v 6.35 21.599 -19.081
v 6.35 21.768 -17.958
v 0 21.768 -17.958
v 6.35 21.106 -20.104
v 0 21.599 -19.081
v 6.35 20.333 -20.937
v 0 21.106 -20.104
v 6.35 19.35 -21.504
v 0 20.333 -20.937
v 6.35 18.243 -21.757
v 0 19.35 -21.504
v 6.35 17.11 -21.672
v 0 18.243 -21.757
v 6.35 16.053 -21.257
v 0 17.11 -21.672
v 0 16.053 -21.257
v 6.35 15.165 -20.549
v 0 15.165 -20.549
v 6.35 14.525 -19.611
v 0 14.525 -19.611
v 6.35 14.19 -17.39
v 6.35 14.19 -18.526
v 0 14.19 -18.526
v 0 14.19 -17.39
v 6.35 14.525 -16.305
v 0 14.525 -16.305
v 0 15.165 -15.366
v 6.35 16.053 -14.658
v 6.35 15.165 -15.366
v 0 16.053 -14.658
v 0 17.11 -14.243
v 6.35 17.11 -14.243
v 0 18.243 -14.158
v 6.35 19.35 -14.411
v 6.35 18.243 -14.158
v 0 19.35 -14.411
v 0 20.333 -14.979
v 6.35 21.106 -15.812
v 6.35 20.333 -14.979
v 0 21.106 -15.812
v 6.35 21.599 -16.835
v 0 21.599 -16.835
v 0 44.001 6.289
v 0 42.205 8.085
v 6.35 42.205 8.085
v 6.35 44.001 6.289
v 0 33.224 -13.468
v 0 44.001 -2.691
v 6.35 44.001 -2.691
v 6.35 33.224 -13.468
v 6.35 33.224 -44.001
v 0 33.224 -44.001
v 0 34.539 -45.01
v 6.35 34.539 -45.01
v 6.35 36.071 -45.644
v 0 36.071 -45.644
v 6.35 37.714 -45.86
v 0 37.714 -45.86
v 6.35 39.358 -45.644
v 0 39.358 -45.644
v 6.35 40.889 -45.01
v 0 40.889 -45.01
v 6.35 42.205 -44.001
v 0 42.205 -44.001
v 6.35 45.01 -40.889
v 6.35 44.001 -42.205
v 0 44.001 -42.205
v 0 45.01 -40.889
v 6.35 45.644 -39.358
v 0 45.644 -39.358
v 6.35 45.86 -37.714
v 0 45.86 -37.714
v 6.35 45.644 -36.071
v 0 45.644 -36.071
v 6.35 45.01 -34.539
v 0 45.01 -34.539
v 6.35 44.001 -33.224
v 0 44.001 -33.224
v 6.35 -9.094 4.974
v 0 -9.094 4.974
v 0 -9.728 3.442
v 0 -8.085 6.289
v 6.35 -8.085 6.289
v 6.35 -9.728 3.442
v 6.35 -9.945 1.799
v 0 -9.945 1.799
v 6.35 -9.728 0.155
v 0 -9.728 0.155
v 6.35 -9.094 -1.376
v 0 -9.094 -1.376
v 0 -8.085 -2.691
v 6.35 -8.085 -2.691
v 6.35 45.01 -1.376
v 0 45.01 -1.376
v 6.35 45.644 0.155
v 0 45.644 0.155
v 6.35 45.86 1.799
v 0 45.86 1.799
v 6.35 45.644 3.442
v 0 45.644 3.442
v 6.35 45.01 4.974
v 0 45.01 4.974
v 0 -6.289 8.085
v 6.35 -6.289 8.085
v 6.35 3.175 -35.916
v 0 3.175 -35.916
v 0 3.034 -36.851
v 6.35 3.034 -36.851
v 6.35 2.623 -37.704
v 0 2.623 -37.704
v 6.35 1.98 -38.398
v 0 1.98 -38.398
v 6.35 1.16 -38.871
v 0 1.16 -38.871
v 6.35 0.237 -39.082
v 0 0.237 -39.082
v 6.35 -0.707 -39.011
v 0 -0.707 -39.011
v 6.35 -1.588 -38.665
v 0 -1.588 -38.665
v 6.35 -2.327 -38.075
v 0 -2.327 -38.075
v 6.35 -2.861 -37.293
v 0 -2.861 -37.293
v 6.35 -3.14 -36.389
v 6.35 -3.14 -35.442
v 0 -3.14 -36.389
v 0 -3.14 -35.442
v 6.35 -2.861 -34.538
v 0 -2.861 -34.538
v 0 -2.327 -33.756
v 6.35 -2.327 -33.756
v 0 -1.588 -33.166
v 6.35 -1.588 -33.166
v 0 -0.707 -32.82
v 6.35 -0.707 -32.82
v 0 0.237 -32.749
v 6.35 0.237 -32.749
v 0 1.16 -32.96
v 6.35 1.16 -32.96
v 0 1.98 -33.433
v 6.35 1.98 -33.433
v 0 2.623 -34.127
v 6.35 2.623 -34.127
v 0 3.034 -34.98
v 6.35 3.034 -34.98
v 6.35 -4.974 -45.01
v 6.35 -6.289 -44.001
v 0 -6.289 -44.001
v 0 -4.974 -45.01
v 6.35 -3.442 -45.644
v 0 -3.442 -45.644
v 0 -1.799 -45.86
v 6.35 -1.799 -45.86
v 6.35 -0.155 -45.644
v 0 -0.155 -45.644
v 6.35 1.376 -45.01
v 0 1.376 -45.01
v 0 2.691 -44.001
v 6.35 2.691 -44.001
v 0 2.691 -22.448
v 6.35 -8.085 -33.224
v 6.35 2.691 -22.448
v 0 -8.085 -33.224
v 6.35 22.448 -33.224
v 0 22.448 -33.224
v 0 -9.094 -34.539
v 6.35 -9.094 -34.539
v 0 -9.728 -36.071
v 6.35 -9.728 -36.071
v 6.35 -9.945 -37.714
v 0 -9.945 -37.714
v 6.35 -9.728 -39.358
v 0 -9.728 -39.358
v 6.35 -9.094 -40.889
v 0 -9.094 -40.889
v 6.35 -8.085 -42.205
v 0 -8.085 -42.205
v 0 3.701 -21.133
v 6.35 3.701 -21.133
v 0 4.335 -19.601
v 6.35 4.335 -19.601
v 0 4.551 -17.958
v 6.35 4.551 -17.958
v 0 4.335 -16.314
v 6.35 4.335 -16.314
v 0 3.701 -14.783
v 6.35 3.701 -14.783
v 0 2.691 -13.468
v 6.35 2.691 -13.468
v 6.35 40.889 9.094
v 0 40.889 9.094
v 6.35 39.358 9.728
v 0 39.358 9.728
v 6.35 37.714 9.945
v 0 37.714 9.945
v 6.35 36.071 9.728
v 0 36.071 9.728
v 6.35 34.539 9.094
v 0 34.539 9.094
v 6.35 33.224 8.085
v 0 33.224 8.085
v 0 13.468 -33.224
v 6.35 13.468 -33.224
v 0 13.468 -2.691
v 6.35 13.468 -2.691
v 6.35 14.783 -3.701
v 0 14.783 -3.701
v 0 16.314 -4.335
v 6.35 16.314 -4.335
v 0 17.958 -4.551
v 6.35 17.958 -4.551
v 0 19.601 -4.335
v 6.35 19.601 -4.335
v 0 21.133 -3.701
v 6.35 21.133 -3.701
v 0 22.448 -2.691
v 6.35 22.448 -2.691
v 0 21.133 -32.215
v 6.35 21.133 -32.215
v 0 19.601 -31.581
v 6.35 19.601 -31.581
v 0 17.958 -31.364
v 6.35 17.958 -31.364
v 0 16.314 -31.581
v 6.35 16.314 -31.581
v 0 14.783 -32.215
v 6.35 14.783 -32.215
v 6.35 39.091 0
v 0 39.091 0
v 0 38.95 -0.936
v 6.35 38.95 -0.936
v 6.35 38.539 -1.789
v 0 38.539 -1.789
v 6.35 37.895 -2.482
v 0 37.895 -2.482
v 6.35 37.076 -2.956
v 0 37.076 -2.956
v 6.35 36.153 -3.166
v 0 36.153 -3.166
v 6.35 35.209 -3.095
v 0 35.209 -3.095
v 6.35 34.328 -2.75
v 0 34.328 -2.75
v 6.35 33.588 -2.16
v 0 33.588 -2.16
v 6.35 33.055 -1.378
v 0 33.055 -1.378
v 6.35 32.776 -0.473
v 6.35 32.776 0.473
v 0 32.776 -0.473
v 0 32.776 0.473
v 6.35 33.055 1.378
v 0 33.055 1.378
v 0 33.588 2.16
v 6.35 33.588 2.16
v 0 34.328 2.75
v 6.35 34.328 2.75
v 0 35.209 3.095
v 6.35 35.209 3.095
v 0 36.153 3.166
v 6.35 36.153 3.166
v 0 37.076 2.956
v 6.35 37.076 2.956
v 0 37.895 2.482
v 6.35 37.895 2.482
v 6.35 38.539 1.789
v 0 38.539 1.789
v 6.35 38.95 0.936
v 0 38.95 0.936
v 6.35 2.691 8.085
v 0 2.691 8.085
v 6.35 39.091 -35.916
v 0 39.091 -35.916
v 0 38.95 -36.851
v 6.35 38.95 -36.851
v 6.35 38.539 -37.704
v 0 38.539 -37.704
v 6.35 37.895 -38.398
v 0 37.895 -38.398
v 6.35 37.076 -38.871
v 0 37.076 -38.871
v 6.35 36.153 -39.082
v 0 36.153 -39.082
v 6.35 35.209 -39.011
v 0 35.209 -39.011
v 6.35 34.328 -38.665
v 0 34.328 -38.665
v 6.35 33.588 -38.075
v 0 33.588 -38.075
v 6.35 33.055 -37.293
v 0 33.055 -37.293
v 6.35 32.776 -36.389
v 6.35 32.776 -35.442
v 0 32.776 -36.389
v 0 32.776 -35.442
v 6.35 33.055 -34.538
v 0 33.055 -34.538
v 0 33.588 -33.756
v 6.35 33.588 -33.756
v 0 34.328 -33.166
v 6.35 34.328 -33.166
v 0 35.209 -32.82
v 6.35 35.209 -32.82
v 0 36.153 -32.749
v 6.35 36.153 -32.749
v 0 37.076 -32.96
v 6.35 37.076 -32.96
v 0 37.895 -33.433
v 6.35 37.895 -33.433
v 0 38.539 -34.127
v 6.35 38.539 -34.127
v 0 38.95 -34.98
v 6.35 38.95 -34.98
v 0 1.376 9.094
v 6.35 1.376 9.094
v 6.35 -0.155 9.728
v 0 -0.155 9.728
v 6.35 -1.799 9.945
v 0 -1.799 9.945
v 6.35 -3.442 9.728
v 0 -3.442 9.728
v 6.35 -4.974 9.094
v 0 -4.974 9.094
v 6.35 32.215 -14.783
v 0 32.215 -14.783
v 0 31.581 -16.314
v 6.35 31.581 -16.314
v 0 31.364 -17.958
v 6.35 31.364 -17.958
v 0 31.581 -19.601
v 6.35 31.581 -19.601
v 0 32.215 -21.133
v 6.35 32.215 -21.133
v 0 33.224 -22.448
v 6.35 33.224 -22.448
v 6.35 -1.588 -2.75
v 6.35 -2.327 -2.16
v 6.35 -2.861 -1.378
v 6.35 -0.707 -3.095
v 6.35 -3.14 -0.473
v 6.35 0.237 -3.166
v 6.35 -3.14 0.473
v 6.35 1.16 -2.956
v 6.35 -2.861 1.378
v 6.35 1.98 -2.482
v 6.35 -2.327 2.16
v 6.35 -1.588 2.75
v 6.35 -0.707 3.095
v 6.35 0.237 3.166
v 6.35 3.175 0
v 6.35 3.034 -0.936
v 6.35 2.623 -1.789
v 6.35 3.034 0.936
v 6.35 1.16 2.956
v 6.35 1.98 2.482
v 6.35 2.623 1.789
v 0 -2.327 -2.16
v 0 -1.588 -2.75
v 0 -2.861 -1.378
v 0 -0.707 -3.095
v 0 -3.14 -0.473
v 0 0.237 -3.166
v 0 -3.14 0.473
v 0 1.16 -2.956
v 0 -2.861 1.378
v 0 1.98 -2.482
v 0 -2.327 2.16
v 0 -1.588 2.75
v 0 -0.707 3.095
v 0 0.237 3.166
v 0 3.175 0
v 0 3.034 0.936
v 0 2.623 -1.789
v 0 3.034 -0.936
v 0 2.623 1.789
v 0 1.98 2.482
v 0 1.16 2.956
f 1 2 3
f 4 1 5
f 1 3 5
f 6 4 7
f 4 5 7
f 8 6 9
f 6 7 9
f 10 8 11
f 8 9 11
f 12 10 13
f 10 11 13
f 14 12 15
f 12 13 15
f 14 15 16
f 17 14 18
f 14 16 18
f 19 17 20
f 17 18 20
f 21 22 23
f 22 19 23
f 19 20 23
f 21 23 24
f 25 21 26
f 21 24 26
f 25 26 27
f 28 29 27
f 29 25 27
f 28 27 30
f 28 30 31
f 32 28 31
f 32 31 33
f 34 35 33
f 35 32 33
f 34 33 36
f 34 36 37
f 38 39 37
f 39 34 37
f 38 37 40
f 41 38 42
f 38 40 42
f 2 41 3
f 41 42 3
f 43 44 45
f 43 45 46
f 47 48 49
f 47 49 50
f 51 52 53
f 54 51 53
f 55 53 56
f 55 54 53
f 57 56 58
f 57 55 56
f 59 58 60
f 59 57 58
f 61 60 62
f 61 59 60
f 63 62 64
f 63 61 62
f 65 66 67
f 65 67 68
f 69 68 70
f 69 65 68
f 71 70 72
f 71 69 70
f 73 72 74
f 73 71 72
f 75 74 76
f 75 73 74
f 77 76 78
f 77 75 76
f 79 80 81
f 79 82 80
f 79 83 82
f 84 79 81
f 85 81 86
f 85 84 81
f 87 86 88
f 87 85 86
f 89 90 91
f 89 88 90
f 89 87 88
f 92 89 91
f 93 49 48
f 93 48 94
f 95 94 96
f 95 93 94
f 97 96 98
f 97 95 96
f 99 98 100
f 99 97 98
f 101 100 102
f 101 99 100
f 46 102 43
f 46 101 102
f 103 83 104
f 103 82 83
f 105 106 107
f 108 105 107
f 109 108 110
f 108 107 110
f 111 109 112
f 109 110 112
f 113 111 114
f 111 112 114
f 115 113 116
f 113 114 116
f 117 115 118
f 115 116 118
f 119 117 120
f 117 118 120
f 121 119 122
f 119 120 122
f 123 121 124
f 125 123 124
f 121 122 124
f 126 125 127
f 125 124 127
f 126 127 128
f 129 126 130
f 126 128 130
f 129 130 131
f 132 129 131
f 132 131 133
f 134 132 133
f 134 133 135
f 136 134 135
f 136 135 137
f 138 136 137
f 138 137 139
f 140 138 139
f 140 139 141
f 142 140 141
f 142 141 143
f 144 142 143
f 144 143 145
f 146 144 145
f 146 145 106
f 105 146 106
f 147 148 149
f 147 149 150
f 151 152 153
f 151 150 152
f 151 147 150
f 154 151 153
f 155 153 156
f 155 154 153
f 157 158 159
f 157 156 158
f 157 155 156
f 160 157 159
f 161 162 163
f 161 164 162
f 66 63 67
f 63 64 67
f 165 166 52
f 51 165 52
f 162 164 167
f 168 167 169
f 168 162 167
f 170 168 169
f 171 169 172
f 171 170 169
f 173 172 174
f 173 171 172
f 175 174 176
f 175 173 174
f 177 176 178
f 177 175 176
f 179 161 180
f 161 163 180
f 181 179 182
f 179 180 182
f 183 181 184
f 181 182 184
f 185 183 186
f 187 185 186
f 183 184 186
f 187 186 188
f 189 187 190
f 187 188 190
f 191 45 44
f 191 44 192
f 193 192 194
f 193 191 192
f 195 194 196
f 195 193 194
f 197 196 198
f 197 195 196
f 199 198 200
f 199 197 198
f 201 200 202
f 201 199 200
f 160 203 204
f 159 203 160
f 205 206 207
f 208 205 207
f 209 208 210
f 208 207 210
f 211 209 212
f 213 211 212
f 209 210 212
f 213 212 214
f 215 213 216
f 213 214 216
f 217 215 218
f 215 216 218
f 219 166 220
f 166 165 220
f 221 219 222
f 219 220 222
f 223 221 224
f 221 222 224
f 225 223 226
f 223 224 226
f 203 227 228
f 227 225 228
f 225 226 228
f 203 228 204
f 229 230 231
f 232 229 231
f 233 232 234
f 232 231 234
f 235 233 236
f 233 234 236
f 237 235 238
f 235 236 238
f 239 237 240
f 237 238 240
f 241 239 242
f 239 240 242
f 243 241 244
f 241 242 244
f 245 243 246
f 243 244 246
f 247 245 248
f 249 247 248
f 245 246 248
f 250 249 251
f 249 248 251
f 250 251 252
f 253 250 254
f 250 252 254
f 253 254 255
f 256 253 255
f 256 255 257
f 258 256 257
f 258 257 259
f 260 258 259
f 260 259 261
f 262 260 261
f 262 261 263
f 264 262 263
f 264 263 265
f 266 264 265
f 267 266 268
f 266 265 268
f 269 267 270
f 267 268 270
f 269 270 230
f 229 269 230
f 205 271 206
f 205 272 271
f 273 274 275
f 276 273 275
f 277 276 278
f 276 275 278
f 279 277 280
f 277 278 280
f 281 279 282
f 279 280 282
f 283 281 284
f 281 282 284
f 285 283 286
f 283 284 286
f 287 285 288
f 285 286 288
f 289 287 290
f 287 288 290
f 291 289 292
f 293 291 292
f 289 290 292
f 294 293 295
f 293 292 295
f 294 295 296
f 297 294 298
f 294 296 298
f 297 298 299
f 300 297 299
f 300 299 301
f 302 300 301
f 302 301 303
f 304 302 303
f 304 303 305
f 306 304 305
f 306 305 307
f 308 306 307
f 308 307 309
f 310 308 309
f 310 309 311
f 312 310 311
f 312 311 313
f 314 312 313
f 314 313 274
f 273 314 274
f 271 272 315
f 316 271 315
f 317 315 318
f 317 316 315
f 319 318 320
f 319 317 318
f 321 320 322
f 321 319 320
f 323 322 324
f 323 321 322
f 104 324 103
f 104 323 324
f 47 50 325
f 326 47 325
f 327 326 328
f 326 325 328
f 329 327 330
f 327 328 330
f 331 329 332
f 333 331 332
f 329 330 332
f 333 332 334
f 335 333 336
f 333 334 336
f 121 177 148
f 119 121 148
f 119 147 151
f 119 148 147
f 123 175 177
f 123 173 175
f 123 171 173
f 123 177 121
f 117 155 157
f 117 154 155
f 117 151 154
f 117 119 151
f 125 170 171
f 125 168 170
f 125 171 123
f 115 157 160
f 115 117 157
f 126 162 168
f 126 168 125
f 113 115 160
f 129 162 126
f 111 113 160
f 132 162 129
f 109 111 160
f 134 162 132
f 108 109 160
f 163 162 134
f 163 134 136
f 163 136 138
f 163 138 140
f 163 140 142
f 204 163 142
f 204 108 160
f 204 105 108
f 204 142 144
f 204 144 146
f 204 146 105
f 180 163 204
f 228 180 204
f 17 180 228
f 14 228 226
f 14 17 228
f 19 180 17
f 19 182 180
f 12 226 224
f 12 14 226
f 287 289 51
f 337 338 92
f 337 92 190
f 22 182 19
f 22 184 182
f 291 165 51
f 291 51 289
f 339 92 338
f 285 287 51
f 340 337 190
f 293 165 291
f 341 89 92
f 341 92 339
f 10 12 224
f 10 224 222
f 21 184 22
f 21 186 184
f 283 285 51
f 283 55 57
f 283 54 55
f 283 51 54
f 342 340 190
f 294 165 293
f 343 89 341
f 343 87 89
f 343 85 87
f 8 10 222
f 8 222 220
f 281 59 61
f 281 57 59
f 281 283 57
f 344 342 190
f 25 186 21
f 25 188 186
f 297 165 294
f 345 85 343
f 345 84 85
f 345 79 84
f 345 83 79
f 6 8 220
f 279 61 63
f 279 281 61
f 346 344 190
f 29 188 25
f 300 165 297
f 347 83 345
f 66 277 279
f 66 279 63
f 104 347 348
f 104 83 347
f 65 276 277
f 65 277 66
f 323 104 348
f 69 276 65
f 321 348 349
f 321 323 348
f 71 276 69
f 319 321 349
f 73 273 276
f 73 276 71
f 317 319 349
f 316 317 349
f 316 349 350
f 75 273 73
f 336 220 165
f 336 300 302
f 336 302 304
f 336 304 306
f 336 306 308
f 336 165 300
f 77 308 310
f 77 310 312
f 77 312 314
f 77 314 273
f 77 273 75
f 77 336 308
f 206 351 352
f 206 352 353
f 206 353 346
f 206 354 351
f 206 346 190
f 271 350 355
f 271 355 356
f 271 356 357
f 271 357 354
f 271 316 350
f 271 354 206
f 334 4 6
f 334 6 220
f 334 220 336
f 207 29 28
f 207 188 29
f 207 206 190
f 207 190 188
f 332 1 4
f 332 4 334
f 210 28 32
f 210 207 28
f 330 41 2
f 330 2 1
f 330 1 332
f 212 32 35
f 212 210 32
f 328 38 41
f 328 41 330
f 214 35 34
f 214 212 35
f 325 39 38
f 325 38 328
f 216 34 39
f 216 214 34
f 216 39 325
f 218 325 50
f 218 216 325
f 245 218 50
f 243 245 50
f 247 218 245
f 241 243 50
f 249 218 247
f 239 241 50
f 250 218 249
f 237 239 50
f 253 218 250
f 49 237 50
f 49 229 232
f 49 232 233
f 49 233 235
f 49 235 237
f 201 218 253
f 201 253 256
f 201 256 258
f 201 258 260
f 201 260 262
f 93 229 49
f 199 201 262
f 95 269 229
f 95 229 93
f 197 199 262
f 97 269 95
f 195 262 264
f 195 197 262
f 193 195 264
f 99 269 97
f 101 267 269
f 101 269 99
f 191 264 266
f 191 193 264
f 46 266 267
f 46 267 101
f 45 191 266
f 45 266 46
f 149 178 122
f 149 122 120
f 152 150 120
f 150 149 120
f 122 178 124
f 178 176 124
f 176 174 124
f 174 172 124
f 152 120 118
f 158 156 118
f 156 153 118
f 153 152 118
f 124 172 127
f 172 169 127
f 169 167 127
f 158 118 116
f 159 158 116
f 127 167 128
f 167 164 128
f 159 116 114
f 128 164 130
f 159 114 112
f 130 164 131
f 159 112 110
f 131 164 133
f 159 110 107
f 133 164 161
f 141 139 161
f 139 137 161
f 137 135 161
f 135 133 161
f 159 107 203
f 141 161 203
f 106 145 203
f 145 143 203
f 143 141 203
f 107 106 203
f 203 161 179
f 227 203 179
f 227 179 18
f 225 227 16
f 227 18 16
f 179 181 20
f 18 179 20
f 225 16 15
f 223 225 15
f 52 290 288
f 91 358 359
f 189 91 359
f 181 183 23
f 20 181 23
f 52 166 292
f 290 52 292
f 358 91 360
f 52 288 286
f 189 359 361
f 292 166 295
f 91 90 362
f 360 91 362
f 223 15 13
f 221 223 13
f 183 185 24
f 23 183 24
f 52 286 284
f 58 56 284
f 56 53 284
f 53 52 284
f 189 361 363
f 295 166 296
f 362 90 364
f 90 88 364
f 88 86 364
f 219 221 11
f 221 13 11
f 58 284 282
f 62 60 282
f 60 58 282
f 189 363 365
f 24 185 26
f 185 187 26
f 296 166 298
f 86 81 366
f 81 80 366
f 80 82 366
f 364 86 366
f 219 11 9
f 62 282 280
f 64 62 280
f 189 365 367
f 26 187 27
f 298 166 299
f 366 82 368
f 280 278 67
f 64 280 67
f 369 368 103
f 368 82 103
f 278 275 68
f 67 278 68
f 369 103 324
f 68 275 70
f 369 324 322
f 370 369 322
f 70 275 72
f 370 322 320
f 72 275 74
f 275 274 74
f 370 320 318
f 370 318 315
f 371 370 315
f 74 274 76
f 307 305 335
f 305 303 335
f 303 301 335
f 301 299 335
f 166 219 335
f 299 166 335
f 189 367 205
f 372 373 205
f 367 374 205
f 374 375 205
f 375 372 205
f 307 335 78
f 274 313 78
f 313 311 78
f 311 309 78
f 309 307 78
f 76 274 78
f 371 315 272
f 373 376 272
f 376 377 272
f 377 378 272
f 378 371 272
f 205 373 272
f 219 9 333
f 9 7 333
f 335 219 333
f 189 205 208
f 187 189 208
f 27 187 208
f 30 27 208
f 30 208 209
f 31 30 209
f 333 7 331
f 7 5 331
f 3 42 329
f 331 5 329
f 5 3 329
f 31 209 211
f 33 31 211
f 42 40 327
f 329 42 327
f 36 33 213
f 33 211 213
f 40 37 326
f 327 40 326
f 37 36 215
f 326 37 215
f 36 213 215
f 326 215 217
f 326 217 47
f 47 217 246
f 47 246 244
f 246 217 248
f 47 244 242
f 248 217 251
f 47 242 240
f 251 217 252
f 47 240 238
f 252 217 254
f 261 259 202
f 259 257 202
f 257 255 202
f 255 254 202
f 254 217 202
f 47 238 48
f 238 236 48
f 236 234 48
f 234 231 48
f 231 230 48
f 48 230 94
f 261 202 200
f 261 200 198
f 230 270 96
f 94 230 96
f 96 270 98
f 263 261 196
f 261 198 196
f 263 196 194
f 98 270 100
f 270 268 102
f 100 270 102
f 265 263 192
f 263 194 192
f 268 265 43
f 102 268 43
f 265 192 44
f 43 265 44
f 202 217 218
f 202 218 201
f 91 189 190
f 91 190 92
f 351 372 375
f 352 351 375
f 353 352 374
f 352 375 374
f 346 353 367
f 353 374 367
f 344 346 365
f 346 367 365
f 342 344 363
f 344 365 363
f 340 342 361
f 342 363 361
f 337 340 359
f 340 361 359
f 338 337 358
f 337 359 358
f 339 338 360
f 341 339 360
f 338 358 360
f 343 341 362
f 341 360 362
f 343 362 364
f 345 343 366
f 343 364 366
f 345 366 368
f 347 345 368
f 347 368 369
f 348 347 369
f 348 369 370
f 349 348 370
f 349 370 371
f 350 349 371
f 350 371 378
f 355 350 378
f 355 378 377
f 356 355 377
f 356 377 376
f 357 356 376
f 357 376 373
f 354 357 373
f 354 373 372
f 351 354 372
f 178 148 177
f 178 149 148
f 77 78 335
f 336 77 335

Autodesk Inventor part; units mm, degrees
ref_plane "YZ Plane" through (0, 0, 0) normal (1, 0, 0) x (0, 1, 0)
ref_plane "XZ Plane" through (0, 0, 0) normal (0, 1, 0) x (-1, 0, 0)
ref_plane "XY Plane" through (0, 0, 0) normal (0, 0, 1) x (1, 0, 0)
sketch "Sketch1" plane through (0, 0, 0) normal (1, 0, 0) x (0, 1, 0)
  circle A0 centre (17.9578, -17.9578) radius 3.81
  circle A1 centre (35.9156, 0) radius 3.175
  circle A2 centre (0, -35.9156) radius 3.175
  circle A3 centre (35.9156, -35.9156) radius 3.175
  circle A4 centre (0, 0) radius 3.175
  line L0 (17.9578, -17.9578) -> (23.346, -23.346)
  line L1 (23.346, -23.346) -> (12.5696, -23.346)
  line L2 (17.9578, -28.7341) -> (37.7144, -48.4907)
  line L3 (37.7144, -48.4907) -> (48.4907, -37.7144)
  line L4 (48.4907, -37.7144) -> (28.7341, -17.9578)
  line L5 (17.9578, -28.7341) -> (-1.7988, -48.4907)
  line L6 (-1.7988, -48.4907) -> (-12.5751, -37.7144)
  line L7 (-12.5751, -37.7144) -> (7.1815, -17.9578)
  line L8 (7.1815, -17.9578) -> (-12.5751, 1.7988)
  line L9 (-12.5751, 1.7988) -> (-1.7988, 12.5751)
  line L10 (-1.7988, 12.5751) -> (17.9578, -7.1815)
  line L11 (17.9578, -7.1815) -> (37.7144, 12.5751)
  line L12 (37.7144, 12.5751) -> (48.4907, 1.7988)
  line L13 (48.4907, 1.7988) -> (28.7341, -17.9578)
  line L14 (35.9156, 0) -> (33.6705, -2.2451)
  line L15 (0, 0) -> (2.2451, -2.2451)
  line L16 (15.2637, -15.2637) -> (17.9578, -17.9578)
  line L17 (22.6724, -13.2432) -> (20.6519, -15.2637)
  line L18 (15.2637, -20.6519) -> (12.5696, -23.346)
  line L19 (2.2451, -33.6705) -> (0, -35.9156)
  line L20 (35.9156, 0) -> (35.9156, -3.175)
  line L21 (35.9156, -32.7406) -> (35.9156, -35.9156)
  line L22 (35.9156, -35.9156) -> (32.7406, -35.9156)
  line L23 (3.175, -35.9156) -> (0, -35.9156)
  line L24 (0, -35.9156) -> (0, -32.7406)
  line L25 (0, -3.175) -> (0, 0)
  line L26 (0, 0) -> (3.175, 0)
  line L27 (32.7406, 0) -> (35.9156, 0)
  point P0 (20.6519, -20.6519)
  dimension "d0" = 35.9156
  dimension "d1" = 35.9156
  dimension "d2" = 7.62
  dimension "d3" = 6.35
  dimension "d4" = 6.35
  dimension "d5" = 6.35
  dimension "d6" = 6.35
  dimension "d7" = 7.62
  dimension "d8" = 35.56
  dimension "d9" = 15.24
  dimension "d10" = 35.56
  dimension "d11" = 15.24
  dimension "d12" = 35.56
extrude "Extrusion1" add sketch "Sketch1" along normal blind 6.35 contours L0 L1 L18 A0 | L5 L6 L7 L8 L9 L10 L11 L12 L13 L4 L3 L2
fillet "Fillet1" radius 6.35 12 edges at (3.175, 28.7341, -17.9578) (3.175, 48.4907, -37.7144) (3.175, 37.7144, -48.4907) (3.175, -1.7988, -48.4907) (3.175, -1.7988, 12.5751) (3.175, 37.7144, 12.5751) (3.175, 48.4907, 1.7988) (3.175, 17.9578, -28.7341) (3.175, -12.5751, -37.7144) (3.175, -12.5751, 1.7988) (3.175, 7.1815, -17.9578) (3.175, 17.9578, -7.1815)
properties part number "Gearbox"
